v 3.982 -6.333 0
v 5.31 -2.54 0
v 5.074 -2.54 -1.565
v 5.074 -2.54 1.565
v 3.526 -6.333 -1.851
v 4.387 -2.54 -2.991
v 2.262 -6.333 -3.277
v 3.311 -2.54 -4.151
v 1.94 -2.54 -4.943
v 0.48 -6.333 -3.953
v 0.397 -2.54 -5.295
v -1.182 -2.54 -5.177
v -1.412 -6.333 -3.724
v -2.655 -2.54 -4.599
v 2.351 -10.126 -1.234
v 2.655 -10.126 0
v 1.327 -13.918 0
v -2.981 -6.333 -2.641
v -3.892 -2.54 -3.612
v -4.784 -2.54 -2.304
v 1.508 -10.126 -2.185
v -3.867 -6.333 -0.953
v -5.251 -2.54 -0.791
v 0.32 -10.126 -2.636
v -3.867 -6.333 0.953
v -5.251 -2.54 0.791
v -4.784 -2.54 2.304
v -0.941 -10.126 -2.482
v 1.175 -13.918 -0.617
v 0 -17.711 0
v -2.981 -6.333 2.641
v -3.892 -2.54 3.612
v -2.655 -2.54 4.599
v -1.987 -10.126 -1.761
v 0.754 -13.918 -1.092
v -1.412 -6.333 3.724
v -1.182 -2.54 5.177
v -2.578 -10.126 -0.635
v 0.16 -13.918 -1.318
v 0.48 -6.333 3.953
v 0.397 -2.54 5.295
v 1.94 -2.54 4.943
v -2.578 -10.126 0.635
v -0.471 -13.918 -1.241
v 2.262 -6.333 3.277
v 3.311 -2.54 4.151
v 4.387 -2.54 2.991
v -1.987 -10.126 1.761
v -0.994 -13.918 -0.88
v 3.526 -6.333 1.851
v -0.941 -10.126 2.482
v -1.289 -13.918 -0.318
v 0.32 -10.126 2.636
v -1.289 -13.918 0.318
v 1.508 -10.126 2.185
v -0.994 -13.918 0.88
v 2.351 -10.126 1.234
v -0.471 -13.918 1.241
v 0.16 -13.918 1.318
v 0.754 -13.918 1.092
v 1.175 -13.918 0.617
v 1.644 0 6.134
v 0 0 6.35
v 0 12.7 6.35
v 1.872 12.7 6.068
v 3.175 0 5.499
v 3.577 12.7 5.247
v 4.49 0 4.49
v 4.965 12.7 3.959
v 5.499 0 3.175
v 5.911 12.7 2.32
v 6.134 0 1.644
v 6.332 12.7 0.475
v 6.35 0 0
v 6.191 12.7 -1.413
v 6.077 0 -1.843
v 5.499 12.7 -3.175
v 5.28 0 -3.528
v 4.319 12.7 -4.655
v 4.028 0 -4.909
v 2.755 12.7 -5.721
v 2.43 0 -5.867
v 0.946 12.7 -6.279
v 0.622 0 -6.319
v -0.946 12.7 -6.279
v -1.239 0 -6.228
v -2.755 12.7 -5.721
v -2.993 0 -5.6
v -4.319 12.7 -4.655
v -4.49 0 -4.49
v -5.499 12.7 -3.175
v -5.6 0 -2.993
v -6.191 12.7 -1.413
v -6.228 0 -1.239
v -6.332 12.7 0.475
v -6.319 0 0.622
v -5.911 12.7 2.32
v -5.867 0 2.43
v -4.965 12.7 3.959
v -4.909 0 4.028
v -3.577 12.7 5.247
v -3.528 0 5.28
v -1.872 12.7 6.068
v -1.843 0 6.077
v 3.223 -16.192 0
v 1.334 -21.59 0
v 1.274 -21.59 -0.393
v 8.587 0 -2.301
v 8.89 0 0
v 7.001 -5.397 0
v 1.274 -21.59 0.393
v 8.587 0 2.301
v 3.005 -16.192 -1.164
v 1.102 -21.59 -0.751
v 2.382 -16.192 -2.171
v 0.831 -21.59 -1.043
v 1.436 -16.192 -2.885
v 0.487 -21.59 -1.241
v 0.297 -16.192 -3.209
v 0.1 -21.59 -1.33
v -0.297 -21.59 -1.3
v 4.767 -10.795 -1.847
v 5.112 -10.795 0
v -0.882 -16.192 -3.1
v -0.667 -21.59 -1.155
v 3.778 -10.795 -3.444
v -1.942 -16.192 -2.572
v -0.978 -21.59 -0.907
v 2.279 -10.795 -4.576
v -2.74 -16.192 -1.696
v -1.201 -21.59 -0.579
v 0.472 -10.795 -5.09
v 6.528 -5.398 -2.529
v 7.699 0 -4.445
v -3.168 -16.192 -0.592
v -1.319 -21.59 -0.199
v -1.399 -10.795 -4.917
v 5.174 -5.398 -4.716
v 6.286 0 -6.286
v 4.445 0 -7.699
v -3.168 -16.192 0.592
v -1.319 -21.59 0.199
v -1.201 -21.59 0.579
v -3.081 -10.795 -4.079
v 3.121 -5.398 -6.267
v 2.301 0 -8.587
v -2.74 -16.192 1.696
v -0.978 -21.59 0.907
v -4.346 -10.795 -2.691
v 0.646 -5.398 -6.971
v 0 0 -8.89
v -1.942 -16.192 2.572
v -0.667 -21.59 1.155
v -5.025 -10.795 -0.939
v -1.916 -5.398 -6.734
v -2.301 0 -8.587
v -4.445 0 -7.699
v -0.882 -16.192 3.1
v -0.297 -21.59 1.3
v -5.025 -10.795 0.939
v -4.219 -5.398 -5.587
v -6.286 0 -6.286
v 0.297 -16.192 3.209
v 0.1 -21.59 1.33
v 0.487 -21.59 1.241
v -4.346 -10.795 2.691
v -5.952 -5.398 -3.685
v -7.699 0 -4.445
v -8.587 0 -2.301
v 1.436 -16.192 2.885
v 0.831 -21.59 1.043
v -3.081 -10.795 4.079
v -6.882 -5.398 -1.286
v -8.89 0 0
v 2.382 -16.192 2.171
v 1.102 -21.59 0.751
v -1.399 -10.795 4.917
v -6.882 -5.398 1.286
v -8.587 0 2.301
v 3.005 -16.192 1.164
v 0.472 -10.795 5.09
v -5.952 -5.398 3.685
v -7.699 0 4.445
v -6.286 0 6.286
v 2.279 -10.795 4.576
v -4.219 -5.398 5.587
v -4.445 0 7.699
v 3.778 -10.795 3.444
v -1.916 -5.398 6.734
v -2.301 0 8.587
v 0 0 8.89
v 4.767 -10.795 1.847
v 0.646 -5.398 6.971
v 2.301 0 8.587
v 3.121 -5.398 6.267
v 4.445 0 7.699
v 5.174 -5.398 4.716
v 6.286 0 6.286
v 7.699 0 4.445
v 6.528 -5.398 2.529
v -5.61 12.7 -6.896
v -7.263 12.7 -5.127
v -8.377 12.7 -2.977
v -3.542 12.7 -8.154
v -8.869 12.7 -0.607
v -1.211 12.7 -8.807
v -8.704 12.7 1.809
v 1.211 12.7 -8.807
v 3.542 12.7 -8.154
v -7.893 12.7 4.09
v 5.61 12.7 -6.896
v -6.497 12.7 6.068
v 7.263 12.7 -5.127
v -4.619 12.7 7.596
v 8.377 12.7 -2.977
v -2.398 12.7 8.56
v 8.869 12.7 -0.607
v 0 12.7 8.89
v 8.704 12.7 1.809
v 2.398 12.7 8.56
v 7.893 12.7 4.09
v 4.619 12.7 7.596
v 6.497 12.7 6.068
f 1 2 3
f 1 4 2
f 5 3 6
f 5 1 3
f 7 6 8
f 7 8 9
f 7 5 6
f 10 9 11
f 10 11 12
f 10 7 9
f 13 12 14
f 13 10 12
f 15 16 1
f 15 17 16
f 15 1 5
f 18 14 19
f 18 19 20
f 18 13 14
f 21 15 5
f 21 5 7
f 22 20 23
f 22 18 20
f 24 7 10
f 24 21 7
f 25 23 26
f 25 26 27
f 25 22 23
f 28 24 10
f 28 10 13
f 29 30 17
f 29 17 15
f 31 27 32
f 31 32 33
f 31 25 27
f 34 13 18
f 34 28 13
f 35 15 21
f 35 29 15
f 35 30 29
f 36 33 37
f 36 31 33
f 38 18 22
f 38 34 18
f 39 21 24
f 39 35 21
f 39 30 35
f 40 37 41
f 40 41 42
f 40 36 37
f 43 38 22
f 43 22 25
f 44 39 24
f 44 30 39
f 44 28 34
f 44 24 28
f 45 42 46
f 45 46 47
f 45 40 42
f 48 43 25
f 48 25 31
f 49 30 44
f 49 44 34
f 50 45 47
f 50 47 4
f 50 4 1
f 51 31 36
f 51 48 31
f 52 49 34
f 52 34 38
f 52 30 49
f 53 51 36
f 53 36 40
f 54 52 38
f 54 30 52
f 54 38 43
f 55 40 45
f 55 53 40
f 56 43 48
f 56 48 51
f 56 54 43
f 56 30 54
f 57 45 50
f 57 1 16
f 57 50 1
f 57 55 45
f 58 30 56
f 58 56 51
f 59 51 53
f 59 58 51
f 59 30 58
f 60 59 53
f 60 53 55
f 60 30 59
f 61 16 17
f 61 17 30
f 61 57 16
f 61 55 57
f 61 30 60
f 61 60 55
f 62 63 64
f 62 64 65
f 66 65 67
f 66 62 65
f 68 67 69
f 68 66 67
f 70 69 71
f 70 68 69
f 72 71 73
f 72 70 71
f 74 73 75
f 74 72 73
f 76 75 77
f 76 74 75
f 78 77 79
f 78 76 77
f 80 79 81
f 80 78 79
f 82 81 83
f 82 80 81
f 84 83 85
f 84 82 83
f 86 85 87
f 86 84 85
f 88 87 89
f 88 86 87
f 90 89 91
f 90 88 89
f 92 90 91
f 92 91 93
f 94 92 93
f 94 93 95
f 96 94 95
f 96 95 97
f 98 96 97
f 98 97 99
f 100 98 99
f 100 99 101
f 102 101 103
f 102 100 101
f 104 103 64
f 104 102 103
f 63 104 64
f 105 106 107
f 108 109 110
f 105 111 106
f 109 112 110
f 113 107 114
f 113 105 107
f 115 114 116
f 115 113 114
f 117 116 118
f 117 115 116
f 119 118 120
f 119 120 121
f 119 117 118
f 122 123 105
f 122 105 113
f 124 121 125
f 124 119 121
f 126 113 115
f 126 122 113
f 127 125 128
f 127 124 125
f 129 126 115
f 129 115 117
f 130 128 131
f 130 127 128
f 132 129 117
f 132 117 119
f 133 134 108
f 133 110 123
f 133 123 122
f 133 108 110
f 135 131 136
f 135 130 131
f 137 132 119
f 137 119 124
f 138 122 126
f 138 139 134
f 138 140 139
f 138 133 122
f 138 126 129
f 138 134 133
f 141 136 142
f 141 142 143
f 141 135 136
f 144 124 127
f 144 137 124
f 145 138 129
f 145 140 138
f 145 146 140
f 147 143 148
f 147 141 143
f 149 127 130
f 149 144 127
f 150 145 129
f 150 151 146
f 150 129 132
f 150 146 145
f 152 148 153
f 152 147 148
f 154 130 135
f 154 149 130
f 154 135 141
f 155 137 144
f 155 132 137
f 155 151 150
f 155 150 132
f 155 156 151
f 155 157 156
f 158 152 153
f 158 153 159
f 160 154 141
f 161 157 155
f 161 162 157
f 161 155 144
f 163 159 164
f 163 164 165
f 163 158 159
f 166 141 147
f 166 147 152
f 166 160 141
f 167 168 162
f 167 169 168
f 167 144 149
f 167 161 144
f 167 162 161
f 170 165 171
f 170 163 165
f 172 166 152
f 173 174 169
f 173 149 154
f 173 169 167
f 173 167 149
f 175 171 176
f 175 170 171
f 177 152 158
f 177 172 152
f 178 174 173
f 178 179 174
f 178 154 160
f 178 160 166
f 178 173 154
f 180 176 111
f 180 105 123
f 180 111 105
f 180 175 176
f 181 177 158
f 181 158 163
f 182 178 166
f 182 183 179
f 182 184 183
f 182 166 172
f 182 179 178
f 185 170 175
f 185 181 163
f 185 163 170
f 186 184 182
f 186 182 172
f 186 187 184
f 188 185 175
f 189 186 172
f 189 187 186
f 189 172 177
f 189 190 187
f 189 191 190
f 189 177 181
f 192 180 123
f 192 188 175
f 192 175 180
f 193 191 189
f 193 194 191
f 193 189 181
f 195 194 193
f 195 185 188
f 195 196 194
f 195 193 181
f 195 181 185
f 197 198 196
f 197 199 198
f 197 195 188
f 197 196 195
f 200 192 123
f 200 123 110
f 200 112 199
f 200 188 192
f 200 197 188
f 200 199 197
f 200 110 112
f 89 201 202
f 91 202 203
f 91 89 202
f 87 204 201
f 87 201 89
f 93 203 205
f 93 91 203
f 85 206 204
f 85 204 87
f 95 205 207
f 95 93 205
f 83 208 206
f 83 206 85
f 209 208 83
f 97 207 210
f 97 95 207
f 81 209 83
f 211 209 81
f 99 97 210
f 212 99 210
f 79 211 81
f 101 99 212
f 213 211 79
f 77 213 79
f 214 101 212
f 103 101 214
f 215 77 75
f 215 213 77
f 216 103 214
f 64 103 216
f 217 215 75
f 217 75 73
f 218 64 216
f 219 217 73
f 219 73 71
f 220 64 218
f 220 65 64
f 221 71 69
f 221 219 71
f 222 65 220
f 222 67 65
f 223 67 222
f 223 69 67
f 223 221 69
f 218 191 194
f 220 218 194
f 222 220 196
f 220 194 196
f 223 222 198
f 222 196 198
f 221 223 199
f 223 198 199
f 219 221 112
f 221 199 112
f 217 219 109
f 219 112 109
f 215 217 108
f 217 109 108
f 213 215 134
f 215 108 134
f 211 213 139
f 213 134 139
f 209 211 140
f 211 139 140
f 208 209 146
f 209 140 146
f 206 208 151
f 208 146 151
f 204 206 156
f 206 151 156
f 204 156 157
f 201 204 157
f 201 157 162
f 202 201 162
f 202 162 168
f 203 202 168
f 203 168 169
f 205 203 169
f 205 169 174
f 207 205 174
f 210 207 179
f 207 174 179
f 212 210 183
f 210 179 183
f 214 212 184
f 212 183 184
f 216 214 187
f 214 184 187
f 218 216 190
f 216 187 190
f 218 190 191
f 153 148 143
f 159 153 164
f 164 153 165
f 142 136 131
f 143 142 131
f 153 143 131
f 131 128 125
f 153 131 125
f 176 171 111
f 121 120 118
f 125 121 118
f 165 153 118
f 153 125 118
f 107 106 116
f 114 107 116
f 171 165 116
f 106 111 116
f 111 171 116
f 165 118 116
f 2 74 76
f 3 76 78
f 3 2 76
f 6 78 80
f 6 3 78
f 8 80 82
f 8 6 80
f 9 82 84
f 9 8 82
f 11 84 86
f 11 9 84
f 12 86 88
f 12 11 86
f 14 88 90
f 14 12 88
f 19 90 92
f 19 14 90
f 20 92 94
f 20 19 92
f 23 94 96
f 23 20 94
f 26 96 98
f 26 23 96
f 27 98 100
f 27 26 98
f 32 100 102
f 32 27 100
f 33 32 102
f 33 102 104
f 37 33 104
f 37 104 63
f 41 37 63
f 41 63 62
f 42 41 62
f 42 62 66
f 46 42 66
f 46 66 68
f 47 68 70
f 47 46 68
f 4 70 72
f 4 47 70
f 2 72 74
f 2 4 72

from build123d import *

# Parameters (mm, degrees)
SKETCH1_R               = 8.89
SKETCH1_R_2             = 6.35
BOSS_EXTRUDE1_DEPTH     = 12.7
CUT_EXTRUDE1_DEPTH      = 29.341210278
CUT_EXTRUDE1_DEPTH_BACK = 29.341210278
SKETCH4_W               = 12.7
SKETCH4_H               = 5.08


# Read off the part's stored shape, not the designer's step: Revolve6
with BuildPart() as part:
    # Sketch1 → Boss-Extrude1 (new body)
    with BuildSketch(Plane(origin=(0, 0, 0), x_dir=(1, 0, 0), z_dir=(0, 1, 0))):
        with Locations(Location((0, 0, 0), (0, 0, 270))):
            Circle(SKETCH1_R)
        with Locations(Location((0, 0, 0), (0, 0, 270))):
            Circle(SKETCH1_R_2, mode=Mode.SUBTRACT)
    extrude(amount=BOSS_EXTRUDE1_DEPTH)

    # Revolve6 outline → Revolve6 (revolve)
    with BuildSketch(Plane.XY):
        Polygon((6.35, 0), (5.309918247, -2.54), (0, -17.711194992), (0, -25.4), (8.89, 0), align=None)
    revolve(axis=Axis((0, 0, 0), (0, 1, 0)))

    # Sketch4 → Cut-Extrude1 (cut, two sides: drawn at the far end of the back side and taken through both)
    with BuildSketch(Plane.XY.offset(-CUT_EXTRUDE1_DEPTH_BACK)):
        with Locations((0, -24.13)):
            Rectangle(SKETCH4_W, SKETCH4_H)
    extrude(amount=CUT_EXTRUDE1_DEPTH + CUT_EXTRUDE1_DEPTH_BACK, mode=Mode.SUBTRACT)


solid = part.part
